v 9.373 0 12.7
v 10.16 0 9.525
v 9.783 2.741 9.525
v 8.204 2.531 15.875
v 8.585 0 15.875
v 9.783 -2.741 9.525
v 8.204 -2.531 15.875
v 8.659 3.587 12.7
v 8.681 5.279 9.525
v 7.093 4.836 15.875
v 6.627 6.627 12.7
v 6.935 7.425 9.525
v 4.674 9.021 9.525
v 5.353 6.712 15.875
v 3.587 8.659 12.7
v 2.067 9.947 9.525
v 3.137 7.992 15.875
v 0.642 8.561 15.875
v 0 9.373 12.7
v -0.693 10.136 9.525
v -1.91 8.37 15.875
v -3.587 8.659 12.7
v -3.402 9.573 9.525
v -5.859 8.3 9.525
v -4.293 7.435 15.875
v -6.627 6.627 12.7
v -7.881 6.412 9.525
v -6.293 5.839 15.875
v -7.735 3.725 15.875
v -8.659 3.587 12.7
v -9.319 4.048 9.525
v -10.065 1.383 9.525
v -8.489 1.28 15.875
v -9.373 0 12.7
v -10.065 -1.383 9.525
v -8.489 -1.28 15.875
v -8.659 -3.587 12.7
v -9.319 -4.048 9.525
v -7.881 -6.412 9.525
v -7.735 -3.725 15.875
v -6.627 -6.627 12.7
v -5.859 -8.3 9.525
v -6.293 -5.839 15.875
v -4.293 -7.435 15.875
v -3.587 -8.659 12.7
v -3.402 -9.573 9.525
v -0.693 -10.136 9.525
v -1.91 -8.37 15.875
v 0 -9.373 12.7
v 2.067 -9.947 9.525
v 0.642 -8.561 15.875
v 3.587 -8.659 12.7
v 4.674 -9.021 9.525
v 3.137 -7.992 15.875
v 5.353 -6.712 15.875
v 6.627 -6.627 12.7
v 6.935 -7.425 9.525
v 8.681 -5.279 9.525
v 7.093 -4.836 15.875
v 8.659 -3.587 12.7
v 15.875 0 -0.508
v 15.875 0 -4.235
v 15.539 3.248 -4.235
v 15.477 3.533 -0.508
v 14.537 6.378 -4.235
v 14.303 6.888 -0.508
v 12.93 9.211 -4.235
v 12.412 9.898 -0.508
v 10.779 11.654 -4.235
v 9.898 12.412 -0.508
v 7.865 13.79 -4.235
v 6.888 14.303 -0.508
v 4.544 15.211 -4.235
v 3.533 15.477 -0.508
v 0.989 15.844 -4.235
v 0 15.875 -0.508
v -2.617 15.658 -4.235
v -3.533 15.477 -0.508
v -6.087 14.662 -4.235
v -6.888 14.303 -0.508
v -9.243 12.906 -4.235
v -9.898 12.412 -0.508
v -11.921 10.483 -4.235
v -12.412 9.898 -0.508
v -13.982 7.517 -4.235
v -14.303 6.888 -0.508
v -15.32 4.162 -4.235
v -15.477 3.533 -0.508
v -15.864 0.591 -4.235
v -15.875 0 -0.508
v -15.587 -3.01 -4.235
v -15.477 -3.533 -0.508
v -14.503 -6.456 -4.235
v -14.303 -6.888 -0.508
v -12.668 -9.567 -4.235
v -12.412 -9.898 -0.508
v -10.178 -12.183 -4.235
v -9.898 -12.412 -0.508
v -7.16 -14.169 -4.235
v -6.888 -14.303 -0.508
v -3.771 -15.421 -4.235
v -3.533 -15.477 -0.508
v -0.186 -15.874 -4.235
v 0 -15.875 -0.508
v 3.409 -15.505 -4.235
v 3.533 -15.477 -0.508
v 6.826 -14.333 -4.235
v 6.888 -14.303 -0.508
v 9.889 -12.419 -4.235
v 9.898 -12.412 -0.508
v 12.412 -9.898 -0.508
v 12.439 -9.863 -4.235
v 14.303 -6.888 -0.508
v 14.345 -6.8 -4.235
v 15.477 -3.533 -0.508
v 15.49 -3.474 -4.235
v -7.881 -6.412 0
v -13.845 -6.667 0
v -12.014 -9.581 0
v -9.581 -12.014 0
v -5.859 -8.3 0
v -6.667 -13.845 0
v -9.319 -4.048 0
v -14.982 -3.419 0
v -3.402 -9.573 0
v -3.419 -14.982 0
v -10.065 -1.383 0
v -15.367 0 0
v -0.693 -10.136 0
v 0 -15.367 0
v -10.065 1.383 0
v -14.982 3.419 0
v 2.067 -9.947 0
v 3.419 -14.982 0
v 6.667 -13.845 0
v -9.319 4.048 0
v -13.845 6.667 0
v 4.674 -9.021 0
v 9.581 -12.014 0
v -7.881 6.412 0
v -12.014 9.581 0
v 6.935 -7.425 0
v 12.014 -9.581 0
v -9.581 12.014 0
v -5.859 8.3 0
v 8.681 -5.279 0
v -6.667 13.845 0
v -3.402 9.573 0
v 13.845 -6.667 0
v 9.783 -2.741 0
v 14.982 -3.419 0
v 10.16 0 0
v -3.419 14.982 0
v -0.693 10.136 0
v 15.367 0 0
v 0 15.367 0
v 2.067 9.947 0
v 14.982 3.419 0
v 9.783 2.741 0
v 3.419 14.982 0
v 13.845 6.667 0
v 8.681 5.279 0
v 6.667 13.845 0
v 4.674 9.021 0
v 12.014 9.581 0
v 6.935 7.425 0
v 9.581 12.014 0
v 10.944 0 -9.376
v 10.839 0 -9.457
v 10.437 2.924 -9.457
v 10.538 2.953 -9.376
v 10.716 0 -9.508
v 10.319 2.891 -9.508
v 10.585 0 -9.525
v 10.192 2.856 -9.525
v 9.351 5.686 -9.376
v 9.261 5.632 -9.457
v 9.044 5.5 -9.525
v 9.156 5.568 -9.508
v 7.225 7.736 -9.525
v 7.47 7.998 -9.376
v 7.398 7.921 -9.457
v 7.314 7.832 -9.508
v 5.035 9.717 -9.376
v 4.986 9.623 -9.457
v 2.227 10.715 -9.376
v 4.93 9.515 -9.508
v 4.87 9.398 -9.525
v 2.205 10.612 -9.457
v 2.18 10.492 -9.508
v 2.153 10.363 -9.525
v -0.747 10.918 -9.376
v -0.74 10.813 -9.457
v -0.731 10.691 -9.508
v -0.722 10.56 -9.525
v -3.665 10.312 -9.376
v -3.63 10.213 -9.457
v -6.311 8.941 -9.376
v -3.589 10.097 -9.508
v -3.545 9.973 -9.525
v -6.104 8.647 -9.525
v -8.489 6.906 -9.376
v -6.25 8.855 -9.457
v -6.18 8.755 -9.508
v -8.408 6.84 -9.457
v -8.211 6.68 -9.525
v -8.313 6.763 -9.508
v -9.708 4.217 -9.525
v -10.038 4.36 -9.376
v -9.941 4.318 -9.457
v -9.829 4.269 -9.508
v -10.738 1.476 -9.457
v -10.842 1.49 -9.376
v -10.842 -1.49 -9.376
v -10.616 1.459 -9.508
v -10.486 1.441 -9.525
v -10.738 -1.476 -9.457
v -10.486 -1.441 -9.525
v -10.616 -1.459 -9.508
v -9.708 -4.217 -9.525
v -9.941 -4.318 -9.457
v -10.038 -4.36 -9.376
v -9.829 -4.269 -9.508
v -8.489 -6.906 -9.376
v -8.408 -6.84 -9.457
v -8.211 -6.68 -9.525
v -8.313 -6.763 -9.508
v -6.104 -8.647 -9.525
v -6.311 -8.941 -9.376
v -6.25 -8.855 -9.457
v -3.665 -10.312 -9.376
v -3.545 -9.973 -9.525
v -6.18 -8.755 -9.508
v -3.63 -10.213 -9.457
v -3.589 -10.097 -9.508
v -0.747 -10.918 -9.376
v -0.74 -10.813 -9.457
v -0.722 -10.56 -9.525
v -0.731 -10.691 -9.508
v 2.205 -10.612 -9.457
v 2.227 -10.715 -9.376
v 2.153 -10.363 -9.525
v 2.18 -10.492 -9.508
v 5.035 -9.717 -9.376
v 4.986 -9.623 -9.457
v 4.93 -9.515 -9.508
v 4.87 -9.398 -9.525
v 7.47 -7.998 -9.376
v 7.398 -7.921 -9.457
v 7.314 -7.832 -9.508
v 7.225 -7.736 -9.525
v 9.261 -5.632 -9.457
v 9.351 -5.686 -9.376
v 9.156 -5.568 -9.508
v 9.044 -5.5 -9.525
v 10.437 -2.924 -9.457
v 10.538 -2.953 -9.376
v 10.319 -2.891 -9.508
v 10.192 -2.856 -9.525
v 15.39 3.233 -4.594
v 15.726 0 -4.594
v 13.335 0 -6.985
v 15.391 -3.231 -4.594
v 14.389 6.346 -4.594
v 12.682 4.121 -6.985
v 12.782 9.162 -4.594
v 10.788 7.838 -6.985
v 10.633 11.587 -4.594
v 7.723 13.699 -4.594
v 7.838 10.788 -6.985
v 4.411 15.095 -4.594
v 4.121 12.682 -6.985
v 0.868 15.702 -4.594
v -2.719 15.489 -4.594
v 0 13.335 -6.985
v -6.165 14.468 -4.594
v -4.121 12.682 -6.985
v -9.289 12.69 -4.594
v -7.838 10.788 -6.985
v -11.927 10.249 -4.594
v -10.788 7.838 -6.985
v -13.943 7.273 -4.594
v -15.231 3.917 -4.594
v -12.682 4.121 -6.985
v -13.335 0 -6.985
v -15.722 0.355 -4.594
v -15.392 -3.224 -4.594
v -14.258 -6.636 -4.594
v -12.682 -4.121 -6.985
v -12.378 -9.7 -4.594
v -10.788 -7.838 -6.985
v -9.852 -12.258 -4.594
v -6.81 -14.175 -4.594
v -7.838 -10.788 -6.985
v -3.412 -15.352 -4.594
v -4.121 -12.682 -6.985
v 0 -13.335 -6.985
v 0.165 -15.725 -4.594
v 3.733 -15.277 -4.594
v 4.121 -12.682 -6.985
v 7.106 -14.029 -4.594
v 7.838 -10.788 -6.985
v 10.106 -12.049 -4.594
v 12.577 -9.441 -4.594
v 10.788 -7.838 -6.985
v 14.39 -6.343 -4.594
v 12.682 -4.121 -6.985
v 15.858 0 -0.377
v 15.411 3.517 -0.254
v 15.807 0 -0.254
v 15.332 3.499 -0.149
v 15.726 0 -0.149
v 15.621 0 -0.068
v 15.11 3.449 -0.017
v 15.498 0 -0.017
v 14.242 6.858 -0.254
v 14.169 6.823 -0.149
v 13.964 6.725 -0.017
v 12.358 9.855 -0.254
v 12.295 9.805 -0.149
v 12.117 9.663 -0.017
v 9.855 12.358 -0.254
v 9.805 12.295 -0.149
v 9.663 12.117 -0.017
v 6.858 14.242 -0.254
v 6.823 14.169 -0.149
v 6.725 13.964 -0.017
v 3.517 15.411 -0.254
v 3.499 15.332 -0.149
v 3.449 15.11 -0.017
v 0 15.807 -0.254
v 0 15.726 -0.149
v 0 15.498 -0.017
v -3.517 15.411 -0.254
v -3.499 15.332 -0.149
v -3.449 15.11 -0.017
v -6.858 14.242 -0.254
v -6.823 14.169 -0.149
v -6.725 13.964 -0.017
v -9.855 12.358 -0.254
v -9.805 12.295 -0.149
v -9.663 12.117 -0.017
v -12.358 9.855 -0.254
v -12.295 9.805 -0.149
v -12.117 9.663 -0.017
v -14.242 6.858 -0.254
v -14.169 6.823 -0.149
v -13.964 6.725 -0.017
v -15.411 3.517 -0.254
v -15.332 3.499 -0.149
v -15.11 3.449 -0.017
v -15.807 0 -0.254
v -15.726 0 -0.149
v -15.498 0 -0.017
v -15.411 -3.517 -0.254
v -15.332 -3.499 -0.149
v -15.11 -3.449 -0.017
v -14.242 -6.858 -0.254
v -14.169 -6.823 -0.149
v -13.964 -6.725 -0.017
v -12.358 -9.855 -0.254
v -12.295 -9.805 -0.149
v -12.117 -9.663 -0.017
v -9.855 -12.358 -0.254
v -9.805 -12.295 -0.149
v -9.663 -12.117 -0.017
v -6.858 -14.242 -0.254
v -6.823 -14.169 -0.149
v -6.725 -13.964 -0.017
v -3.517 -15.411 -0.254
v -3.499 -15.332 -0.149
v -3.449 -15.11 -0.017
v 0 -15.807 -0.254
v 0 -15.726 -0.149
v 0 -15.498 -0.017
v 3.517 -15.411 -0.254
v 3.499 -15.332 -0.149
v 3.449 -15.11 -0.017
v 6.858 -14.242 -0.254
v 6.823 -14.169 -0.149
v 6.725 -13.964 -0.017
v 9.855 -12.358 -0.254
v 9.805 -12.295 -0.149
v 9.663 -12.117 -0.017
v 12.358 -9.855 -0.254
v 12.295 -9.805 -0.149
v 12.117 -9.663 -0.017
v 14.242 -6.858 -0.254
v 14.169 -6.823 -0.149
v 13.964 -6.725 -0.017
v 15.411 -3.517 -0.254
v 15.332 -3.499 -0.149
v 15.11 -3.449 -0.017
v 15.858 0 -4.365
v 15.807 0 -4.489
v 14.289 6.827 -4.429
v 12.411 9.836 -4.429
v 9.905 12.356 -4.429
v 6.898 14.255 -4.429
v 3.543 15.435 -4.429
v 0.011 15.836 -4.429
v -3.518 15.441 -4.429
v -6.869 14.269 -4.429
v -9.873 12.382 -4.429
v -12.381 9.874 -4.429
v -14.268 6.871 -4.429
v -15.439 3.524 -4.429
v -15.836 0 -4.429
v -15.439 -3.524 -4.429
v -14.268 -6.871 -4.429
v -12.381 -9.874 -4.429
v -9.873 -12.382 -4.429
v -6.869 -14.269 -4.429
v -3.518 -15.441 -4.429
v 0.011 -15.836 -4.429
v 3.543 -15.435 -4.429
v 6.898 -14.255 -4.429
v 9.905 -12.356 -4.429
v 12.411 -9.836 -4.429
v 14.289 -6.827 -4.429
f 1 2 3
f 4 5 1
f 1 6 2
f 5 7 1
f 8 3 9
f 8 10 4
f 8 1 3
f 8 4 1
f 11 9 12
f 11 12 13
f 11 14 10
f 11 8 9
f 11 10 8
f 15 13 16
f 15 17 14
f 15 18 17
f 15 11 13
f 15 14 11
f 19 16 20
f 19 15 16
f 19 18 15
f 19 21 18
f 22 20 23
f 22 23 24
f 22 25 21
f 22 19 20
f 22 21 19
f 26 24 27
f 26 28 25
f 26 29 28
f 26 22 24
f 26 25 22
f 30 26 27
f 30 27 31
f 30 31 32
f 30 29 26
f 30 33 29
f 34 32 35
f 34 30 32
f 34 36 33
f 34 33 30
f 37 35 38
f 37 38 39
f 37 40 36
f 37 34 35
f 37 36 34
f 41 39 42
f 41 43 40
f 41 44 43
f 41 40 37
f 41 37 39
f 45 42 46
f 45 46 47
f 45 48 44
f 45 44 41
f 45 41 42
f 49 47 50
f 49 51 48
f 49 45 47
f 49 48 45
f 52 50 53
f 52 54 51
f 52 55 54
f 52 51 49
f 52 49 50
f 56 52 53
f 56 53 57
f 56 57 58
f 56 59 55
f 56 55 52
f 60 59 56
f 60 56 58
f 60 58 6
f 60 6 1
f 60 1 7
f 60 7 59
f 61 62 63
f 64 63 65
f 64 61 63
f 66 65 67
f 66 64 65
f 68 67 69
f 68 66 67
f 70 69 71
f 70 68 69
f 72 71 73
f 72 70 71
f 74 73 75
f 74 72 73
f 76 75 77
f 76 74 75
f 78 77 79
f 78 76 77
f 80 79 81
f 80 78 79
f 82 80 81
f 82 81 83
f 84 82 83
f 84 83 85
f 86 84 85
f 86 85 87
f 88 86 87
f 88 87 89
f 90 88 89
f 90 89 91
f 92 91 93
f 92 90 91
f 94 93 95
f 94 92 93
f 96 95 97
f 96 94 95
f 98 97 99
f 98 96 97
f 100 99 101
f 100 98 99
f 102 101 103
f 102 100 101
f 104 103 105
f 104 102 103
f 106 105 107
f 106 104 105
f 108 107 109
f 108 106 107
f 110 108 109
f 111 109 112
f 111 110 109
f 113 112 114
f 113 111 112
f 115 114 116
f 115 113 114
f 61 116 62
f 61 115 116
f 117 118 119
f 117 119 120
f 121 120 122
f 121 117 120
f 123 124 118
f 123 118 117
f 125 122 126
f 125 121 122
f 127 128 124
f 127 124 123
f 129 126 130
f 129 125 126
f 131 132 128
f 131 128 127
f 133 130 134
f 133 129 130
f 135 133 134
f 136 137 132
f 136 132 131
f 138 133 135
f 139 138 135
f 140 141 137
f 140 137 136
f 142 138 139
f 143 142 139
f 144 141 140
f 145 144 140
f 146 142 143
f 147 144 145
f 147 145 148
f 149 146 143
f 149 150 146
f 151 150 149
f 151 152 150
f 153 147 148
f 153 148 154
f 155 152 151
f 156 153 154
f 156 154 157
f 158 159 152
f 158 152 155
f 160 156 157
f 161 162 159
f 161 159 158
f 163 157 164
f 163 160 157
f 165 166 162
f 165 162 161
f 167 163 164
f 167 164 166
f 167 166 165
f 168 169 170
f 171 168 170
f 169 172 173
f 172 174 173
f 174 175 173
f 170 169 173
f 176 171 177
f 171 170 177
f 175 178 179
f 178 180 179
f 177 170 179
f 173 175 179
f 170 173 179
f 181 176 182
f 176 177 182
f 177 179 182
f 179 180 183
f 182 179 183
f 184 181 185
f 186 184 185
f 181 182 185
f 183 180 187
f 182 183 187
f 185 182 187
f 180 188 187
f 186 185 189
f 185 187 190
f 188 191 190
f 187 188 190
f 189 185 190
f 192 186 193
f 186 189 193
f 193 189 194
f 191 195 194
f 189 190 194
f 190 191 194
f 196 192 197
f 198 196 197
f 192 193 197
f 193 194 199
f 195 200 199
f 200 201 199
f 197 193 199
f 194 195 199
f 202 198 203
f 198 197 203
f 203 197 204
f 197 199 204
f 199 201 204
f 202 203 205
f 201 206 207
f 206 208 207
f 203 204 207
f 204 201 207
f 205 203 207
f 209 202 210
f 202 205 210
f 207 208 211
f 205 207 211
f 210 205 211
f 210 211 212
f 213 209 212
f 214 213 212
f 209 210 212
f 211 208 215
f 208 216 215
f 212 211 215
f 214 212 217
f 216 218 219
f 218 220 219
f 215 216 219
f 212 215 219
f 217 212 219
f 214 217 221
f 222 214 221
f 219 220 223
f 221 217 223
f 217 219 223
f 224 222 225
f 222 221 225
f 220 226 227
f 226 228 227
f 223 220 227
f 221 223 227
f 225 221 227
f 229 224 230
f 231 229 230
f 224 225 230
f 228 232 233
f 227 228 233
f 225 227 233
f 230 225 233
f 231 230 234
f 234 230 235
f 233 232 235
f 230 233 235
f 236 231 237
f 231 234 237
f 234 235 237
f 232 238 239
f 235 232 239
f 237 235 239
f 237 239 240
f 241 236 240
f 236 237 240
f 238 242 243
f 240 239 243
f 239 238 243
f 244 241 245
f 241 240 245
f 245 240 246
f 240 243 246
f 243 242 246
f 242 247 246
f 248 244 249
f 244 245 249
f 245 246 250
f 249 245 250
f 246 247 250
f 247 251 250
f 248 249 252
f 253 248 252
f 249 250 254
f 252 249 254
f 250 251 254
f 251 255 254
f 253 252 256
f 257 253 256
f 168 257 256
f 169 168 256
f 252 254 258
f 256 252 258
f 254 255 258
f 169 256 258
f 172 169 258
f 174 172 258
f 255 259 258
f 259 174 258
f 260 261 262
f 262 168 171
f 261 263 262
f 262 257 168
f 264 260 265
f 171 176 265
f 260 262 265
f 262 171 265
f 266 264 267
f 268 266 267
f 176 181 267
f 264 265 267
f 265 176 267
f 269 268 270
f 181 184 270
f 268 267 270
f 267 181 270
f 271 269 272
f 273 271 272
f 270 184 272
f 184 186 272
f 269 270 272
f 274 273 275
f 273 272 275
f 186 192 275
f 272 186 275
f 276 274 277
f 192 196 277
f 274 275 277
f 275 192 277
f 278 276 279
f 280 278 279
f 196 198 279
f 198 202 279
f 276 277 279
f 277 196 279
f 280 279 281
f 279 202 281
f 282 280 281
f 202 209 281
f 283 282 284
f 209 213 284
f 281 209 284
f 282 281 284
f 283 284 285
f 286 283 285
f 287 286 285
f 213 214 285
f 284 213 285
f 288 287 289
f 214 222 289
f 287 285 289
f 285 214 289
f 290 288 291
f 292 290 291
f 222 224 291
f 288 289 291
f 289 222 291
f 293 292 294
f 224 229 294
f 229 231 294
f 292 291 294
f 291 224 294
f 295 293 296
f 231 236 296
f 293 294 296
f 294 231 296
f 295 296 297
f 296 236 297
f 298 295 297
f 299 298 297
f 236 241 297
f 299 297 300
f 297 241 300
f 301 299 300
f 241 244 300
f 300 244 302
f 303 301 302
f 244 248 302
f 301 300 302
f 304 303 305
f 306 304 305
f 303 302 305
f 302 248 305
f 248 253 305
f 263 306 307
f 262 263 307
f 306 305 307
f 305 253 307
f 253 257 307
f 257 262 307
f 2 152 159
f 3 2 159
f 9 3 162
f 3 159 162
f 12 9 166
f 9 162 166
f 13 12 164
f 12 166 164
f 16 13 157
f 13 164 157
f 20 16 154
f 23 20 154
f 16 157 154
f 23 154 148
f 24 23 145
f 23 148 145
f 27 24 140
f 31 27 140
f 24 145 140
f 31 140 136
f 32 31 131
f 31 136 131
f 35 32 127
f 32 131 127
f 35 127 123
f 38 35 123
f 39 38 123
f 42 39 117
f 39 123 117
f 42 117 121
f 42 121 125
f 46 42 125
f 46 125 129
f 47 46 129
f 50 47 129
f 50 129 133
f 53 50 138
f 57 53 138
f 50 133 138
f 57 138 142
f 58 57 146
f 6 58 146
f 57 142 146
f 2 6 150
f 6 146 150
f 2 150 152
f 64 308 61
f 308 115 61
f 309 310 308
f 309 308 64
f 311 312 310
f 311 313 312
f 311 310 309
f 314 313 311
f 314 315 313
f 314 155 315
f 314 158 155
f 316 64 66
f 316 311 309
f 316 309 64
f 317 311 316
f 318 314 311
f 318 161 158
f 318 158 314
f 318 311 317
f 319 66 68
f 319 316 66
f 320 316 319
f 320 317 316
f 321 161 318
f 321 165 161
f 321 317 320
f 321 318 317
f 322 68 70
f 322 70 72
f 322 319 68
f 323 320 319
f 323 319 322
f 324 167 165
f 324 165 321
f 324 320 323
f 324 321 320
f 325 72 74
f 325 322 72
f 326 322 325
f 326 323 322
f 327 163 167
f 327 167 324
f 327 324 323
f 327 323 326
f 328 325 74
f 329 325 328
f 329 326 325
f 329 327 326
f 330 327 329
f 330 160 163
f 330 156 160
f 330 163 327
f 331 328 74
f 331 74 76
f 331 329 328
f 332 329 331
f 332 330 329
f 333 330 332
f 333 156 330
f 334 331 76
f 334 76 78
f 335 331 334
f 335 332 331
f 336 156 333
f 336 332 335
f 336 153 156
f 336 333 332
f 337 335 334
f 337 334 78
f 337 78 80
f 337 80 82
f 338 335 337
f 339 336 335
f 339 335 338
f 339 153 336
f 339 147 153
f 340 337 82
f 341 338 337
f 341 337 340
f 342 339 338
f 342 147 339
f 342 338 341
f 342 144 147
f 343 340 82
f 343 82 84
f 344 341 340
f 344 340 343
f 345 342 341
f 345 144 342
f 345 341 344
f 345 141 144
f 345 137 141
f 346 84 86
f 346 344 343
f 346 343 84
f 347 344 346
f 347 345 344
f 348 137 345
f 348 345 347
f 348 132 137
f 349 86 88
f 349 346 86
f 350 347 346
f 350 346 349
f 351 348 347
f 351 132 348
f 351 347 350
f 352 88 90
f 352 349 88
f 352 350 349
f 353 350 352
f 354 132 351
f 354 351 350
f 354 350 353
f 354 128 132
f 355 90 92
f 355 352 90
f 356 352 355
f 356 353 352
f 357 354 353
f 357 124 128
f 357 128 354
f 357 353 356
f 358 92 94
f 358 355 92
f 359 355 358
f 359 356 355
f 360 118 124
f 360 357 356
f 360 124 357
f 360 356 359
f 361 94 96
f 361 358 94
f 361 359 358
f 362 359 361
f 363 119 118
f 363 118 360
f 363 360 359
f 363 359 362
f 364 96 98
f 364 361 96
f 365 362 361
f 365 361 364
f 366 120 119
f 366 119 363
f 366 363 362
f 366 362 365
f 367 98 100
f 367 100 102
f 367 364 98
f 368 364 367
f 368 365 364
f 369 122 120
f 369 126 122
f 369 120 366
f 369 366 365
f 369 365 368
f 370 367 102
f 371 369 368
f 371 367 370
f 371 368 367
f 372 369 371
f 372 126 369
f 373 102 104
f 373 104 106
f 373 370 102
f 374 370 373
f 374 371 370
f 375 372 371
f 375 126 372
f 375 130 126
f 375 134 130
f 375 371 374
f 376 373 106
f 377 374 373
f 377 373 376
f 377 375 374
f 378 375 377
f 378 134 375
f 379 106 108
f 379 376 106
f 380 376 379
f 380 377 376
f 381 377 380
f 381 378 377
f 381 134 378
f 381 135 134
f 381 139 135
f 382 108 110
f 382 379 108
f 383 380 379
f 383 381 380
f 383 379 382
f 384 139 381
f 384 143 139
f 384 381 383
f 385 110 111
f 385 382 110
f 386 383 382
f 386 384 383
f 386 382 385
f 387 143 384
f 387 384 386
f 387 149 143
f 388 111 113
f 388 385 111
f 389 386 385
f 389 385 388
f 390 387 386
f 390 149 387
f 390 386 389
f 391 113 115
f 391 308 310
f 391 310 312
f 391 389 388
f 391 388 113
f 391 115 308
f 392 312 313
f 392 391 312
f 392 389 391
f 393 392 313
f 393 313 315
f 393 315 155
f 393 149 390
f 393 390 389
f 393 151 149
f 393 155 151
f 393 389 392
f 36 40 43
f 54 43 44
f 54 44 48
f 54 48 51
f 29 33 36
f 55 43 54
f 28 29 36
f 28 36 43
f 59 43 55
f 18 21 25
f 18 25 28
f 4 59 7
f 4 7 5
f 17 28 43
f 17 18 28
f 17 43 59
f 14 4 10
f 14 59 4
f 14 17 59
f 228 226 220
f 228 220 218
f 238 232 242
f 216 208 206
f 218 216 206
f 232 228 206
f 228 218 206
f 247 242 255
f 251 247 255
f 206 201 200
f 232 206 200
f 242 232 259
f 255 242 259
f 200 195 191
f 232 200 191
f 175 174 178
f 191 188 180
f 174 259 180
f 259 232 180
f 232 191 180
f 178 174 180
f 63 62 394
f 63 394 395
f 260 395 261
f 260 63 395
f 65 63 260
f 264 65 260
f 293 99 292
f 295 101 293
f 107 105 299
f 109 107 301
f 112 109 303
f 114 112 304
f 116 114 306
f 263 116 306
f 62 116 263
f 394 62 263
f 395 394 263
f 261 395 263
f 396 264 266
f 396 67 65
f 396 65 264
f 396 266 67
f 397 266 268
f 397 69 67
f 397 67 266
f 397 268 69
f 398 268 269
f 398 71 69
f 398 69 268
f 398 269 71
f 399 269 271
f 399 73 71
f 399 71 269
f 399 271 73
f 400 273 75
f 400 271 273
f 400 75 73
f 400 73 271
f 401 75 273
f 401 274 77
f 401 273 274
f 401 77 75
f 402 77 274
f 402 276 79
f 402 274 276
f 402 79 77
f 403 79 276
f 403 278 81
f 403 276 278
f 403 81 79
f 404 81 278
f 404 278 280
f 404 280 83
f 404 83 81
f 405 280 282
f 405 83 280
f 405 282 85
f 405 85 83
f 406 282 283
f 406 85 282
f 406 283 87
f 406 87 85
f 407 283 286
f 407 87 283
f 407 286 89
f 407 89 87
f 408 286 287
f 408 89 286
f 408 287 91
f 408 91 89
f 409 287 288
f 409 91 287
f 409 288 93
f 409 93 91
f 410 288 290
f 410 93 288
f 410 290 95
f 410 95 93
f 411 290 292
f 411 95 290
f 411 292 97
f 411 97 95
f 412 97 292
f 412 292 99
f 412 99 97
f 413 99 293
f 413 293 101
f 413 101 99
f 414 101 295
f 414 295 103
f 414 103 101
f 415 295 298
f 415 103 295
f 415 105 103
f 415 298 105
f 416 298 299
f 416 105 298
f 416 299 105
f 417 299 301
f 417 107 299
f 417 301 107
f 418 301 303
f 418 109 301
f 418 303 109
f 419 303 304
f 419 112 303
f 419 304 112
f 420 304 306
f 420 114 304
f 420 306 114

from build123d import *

# Parameters (mm, degrees)
F0_R     = 15.875
F0_R_2   = 10.16
F1_DEPTH = 9.525
F2_DEPTH = 15.875
F3_SIZE2 = 1.5748
F3_SIZE  = 6.35
F4_SIZE  = 5.08
F5_R     = 0.508


with BuildPart() as f1:
    # F0 (on Top) → F1 (new body)
    with BuildSketch(Plane.XY):
        Circle(F0_R)
        Circle(F0_R_2, mode=Mode.SUBTRACT)
        Circle(F0_R_2)
    extrude(amount=-F1_DEPTH)

    # F0 (on Top) → F2 (join)
    with BuildSketch(Plane.XY):
        Circle(F0_R_2)
    extrude(amount=F2_DEPTH)

    # F3
    f3_edges = [f1.edges().sort_by_distance(p)[0] for p in [
        (-10.16, 0, 15.875),
    ]]
    f3_side = f1.faces().sort_by_distance((-10.16, 0, 7.9375))[0]
    chamfer(f3_edges, length=F3_SIZE, length2=F3_SIZE2, reference=f3_side)

    # F4
    f4_edges = [f1.edges().sort_by_distance(p)[0] for p in [
        (-15.875, 0, -9.525),
    ]]
    chamfer(f4_edges, length=F4_SIZE)

    # F5
    f5_edges = [f1.edges().sort_by_distance(p)[0] for p in [
        (-15.875, 0, 0),
        (-15.875, 0, -4.445),
        (-10.795, 0, -9.525),
    ]]
    fillet(f5_edges, radius=F5_R)


solid = f1.part
